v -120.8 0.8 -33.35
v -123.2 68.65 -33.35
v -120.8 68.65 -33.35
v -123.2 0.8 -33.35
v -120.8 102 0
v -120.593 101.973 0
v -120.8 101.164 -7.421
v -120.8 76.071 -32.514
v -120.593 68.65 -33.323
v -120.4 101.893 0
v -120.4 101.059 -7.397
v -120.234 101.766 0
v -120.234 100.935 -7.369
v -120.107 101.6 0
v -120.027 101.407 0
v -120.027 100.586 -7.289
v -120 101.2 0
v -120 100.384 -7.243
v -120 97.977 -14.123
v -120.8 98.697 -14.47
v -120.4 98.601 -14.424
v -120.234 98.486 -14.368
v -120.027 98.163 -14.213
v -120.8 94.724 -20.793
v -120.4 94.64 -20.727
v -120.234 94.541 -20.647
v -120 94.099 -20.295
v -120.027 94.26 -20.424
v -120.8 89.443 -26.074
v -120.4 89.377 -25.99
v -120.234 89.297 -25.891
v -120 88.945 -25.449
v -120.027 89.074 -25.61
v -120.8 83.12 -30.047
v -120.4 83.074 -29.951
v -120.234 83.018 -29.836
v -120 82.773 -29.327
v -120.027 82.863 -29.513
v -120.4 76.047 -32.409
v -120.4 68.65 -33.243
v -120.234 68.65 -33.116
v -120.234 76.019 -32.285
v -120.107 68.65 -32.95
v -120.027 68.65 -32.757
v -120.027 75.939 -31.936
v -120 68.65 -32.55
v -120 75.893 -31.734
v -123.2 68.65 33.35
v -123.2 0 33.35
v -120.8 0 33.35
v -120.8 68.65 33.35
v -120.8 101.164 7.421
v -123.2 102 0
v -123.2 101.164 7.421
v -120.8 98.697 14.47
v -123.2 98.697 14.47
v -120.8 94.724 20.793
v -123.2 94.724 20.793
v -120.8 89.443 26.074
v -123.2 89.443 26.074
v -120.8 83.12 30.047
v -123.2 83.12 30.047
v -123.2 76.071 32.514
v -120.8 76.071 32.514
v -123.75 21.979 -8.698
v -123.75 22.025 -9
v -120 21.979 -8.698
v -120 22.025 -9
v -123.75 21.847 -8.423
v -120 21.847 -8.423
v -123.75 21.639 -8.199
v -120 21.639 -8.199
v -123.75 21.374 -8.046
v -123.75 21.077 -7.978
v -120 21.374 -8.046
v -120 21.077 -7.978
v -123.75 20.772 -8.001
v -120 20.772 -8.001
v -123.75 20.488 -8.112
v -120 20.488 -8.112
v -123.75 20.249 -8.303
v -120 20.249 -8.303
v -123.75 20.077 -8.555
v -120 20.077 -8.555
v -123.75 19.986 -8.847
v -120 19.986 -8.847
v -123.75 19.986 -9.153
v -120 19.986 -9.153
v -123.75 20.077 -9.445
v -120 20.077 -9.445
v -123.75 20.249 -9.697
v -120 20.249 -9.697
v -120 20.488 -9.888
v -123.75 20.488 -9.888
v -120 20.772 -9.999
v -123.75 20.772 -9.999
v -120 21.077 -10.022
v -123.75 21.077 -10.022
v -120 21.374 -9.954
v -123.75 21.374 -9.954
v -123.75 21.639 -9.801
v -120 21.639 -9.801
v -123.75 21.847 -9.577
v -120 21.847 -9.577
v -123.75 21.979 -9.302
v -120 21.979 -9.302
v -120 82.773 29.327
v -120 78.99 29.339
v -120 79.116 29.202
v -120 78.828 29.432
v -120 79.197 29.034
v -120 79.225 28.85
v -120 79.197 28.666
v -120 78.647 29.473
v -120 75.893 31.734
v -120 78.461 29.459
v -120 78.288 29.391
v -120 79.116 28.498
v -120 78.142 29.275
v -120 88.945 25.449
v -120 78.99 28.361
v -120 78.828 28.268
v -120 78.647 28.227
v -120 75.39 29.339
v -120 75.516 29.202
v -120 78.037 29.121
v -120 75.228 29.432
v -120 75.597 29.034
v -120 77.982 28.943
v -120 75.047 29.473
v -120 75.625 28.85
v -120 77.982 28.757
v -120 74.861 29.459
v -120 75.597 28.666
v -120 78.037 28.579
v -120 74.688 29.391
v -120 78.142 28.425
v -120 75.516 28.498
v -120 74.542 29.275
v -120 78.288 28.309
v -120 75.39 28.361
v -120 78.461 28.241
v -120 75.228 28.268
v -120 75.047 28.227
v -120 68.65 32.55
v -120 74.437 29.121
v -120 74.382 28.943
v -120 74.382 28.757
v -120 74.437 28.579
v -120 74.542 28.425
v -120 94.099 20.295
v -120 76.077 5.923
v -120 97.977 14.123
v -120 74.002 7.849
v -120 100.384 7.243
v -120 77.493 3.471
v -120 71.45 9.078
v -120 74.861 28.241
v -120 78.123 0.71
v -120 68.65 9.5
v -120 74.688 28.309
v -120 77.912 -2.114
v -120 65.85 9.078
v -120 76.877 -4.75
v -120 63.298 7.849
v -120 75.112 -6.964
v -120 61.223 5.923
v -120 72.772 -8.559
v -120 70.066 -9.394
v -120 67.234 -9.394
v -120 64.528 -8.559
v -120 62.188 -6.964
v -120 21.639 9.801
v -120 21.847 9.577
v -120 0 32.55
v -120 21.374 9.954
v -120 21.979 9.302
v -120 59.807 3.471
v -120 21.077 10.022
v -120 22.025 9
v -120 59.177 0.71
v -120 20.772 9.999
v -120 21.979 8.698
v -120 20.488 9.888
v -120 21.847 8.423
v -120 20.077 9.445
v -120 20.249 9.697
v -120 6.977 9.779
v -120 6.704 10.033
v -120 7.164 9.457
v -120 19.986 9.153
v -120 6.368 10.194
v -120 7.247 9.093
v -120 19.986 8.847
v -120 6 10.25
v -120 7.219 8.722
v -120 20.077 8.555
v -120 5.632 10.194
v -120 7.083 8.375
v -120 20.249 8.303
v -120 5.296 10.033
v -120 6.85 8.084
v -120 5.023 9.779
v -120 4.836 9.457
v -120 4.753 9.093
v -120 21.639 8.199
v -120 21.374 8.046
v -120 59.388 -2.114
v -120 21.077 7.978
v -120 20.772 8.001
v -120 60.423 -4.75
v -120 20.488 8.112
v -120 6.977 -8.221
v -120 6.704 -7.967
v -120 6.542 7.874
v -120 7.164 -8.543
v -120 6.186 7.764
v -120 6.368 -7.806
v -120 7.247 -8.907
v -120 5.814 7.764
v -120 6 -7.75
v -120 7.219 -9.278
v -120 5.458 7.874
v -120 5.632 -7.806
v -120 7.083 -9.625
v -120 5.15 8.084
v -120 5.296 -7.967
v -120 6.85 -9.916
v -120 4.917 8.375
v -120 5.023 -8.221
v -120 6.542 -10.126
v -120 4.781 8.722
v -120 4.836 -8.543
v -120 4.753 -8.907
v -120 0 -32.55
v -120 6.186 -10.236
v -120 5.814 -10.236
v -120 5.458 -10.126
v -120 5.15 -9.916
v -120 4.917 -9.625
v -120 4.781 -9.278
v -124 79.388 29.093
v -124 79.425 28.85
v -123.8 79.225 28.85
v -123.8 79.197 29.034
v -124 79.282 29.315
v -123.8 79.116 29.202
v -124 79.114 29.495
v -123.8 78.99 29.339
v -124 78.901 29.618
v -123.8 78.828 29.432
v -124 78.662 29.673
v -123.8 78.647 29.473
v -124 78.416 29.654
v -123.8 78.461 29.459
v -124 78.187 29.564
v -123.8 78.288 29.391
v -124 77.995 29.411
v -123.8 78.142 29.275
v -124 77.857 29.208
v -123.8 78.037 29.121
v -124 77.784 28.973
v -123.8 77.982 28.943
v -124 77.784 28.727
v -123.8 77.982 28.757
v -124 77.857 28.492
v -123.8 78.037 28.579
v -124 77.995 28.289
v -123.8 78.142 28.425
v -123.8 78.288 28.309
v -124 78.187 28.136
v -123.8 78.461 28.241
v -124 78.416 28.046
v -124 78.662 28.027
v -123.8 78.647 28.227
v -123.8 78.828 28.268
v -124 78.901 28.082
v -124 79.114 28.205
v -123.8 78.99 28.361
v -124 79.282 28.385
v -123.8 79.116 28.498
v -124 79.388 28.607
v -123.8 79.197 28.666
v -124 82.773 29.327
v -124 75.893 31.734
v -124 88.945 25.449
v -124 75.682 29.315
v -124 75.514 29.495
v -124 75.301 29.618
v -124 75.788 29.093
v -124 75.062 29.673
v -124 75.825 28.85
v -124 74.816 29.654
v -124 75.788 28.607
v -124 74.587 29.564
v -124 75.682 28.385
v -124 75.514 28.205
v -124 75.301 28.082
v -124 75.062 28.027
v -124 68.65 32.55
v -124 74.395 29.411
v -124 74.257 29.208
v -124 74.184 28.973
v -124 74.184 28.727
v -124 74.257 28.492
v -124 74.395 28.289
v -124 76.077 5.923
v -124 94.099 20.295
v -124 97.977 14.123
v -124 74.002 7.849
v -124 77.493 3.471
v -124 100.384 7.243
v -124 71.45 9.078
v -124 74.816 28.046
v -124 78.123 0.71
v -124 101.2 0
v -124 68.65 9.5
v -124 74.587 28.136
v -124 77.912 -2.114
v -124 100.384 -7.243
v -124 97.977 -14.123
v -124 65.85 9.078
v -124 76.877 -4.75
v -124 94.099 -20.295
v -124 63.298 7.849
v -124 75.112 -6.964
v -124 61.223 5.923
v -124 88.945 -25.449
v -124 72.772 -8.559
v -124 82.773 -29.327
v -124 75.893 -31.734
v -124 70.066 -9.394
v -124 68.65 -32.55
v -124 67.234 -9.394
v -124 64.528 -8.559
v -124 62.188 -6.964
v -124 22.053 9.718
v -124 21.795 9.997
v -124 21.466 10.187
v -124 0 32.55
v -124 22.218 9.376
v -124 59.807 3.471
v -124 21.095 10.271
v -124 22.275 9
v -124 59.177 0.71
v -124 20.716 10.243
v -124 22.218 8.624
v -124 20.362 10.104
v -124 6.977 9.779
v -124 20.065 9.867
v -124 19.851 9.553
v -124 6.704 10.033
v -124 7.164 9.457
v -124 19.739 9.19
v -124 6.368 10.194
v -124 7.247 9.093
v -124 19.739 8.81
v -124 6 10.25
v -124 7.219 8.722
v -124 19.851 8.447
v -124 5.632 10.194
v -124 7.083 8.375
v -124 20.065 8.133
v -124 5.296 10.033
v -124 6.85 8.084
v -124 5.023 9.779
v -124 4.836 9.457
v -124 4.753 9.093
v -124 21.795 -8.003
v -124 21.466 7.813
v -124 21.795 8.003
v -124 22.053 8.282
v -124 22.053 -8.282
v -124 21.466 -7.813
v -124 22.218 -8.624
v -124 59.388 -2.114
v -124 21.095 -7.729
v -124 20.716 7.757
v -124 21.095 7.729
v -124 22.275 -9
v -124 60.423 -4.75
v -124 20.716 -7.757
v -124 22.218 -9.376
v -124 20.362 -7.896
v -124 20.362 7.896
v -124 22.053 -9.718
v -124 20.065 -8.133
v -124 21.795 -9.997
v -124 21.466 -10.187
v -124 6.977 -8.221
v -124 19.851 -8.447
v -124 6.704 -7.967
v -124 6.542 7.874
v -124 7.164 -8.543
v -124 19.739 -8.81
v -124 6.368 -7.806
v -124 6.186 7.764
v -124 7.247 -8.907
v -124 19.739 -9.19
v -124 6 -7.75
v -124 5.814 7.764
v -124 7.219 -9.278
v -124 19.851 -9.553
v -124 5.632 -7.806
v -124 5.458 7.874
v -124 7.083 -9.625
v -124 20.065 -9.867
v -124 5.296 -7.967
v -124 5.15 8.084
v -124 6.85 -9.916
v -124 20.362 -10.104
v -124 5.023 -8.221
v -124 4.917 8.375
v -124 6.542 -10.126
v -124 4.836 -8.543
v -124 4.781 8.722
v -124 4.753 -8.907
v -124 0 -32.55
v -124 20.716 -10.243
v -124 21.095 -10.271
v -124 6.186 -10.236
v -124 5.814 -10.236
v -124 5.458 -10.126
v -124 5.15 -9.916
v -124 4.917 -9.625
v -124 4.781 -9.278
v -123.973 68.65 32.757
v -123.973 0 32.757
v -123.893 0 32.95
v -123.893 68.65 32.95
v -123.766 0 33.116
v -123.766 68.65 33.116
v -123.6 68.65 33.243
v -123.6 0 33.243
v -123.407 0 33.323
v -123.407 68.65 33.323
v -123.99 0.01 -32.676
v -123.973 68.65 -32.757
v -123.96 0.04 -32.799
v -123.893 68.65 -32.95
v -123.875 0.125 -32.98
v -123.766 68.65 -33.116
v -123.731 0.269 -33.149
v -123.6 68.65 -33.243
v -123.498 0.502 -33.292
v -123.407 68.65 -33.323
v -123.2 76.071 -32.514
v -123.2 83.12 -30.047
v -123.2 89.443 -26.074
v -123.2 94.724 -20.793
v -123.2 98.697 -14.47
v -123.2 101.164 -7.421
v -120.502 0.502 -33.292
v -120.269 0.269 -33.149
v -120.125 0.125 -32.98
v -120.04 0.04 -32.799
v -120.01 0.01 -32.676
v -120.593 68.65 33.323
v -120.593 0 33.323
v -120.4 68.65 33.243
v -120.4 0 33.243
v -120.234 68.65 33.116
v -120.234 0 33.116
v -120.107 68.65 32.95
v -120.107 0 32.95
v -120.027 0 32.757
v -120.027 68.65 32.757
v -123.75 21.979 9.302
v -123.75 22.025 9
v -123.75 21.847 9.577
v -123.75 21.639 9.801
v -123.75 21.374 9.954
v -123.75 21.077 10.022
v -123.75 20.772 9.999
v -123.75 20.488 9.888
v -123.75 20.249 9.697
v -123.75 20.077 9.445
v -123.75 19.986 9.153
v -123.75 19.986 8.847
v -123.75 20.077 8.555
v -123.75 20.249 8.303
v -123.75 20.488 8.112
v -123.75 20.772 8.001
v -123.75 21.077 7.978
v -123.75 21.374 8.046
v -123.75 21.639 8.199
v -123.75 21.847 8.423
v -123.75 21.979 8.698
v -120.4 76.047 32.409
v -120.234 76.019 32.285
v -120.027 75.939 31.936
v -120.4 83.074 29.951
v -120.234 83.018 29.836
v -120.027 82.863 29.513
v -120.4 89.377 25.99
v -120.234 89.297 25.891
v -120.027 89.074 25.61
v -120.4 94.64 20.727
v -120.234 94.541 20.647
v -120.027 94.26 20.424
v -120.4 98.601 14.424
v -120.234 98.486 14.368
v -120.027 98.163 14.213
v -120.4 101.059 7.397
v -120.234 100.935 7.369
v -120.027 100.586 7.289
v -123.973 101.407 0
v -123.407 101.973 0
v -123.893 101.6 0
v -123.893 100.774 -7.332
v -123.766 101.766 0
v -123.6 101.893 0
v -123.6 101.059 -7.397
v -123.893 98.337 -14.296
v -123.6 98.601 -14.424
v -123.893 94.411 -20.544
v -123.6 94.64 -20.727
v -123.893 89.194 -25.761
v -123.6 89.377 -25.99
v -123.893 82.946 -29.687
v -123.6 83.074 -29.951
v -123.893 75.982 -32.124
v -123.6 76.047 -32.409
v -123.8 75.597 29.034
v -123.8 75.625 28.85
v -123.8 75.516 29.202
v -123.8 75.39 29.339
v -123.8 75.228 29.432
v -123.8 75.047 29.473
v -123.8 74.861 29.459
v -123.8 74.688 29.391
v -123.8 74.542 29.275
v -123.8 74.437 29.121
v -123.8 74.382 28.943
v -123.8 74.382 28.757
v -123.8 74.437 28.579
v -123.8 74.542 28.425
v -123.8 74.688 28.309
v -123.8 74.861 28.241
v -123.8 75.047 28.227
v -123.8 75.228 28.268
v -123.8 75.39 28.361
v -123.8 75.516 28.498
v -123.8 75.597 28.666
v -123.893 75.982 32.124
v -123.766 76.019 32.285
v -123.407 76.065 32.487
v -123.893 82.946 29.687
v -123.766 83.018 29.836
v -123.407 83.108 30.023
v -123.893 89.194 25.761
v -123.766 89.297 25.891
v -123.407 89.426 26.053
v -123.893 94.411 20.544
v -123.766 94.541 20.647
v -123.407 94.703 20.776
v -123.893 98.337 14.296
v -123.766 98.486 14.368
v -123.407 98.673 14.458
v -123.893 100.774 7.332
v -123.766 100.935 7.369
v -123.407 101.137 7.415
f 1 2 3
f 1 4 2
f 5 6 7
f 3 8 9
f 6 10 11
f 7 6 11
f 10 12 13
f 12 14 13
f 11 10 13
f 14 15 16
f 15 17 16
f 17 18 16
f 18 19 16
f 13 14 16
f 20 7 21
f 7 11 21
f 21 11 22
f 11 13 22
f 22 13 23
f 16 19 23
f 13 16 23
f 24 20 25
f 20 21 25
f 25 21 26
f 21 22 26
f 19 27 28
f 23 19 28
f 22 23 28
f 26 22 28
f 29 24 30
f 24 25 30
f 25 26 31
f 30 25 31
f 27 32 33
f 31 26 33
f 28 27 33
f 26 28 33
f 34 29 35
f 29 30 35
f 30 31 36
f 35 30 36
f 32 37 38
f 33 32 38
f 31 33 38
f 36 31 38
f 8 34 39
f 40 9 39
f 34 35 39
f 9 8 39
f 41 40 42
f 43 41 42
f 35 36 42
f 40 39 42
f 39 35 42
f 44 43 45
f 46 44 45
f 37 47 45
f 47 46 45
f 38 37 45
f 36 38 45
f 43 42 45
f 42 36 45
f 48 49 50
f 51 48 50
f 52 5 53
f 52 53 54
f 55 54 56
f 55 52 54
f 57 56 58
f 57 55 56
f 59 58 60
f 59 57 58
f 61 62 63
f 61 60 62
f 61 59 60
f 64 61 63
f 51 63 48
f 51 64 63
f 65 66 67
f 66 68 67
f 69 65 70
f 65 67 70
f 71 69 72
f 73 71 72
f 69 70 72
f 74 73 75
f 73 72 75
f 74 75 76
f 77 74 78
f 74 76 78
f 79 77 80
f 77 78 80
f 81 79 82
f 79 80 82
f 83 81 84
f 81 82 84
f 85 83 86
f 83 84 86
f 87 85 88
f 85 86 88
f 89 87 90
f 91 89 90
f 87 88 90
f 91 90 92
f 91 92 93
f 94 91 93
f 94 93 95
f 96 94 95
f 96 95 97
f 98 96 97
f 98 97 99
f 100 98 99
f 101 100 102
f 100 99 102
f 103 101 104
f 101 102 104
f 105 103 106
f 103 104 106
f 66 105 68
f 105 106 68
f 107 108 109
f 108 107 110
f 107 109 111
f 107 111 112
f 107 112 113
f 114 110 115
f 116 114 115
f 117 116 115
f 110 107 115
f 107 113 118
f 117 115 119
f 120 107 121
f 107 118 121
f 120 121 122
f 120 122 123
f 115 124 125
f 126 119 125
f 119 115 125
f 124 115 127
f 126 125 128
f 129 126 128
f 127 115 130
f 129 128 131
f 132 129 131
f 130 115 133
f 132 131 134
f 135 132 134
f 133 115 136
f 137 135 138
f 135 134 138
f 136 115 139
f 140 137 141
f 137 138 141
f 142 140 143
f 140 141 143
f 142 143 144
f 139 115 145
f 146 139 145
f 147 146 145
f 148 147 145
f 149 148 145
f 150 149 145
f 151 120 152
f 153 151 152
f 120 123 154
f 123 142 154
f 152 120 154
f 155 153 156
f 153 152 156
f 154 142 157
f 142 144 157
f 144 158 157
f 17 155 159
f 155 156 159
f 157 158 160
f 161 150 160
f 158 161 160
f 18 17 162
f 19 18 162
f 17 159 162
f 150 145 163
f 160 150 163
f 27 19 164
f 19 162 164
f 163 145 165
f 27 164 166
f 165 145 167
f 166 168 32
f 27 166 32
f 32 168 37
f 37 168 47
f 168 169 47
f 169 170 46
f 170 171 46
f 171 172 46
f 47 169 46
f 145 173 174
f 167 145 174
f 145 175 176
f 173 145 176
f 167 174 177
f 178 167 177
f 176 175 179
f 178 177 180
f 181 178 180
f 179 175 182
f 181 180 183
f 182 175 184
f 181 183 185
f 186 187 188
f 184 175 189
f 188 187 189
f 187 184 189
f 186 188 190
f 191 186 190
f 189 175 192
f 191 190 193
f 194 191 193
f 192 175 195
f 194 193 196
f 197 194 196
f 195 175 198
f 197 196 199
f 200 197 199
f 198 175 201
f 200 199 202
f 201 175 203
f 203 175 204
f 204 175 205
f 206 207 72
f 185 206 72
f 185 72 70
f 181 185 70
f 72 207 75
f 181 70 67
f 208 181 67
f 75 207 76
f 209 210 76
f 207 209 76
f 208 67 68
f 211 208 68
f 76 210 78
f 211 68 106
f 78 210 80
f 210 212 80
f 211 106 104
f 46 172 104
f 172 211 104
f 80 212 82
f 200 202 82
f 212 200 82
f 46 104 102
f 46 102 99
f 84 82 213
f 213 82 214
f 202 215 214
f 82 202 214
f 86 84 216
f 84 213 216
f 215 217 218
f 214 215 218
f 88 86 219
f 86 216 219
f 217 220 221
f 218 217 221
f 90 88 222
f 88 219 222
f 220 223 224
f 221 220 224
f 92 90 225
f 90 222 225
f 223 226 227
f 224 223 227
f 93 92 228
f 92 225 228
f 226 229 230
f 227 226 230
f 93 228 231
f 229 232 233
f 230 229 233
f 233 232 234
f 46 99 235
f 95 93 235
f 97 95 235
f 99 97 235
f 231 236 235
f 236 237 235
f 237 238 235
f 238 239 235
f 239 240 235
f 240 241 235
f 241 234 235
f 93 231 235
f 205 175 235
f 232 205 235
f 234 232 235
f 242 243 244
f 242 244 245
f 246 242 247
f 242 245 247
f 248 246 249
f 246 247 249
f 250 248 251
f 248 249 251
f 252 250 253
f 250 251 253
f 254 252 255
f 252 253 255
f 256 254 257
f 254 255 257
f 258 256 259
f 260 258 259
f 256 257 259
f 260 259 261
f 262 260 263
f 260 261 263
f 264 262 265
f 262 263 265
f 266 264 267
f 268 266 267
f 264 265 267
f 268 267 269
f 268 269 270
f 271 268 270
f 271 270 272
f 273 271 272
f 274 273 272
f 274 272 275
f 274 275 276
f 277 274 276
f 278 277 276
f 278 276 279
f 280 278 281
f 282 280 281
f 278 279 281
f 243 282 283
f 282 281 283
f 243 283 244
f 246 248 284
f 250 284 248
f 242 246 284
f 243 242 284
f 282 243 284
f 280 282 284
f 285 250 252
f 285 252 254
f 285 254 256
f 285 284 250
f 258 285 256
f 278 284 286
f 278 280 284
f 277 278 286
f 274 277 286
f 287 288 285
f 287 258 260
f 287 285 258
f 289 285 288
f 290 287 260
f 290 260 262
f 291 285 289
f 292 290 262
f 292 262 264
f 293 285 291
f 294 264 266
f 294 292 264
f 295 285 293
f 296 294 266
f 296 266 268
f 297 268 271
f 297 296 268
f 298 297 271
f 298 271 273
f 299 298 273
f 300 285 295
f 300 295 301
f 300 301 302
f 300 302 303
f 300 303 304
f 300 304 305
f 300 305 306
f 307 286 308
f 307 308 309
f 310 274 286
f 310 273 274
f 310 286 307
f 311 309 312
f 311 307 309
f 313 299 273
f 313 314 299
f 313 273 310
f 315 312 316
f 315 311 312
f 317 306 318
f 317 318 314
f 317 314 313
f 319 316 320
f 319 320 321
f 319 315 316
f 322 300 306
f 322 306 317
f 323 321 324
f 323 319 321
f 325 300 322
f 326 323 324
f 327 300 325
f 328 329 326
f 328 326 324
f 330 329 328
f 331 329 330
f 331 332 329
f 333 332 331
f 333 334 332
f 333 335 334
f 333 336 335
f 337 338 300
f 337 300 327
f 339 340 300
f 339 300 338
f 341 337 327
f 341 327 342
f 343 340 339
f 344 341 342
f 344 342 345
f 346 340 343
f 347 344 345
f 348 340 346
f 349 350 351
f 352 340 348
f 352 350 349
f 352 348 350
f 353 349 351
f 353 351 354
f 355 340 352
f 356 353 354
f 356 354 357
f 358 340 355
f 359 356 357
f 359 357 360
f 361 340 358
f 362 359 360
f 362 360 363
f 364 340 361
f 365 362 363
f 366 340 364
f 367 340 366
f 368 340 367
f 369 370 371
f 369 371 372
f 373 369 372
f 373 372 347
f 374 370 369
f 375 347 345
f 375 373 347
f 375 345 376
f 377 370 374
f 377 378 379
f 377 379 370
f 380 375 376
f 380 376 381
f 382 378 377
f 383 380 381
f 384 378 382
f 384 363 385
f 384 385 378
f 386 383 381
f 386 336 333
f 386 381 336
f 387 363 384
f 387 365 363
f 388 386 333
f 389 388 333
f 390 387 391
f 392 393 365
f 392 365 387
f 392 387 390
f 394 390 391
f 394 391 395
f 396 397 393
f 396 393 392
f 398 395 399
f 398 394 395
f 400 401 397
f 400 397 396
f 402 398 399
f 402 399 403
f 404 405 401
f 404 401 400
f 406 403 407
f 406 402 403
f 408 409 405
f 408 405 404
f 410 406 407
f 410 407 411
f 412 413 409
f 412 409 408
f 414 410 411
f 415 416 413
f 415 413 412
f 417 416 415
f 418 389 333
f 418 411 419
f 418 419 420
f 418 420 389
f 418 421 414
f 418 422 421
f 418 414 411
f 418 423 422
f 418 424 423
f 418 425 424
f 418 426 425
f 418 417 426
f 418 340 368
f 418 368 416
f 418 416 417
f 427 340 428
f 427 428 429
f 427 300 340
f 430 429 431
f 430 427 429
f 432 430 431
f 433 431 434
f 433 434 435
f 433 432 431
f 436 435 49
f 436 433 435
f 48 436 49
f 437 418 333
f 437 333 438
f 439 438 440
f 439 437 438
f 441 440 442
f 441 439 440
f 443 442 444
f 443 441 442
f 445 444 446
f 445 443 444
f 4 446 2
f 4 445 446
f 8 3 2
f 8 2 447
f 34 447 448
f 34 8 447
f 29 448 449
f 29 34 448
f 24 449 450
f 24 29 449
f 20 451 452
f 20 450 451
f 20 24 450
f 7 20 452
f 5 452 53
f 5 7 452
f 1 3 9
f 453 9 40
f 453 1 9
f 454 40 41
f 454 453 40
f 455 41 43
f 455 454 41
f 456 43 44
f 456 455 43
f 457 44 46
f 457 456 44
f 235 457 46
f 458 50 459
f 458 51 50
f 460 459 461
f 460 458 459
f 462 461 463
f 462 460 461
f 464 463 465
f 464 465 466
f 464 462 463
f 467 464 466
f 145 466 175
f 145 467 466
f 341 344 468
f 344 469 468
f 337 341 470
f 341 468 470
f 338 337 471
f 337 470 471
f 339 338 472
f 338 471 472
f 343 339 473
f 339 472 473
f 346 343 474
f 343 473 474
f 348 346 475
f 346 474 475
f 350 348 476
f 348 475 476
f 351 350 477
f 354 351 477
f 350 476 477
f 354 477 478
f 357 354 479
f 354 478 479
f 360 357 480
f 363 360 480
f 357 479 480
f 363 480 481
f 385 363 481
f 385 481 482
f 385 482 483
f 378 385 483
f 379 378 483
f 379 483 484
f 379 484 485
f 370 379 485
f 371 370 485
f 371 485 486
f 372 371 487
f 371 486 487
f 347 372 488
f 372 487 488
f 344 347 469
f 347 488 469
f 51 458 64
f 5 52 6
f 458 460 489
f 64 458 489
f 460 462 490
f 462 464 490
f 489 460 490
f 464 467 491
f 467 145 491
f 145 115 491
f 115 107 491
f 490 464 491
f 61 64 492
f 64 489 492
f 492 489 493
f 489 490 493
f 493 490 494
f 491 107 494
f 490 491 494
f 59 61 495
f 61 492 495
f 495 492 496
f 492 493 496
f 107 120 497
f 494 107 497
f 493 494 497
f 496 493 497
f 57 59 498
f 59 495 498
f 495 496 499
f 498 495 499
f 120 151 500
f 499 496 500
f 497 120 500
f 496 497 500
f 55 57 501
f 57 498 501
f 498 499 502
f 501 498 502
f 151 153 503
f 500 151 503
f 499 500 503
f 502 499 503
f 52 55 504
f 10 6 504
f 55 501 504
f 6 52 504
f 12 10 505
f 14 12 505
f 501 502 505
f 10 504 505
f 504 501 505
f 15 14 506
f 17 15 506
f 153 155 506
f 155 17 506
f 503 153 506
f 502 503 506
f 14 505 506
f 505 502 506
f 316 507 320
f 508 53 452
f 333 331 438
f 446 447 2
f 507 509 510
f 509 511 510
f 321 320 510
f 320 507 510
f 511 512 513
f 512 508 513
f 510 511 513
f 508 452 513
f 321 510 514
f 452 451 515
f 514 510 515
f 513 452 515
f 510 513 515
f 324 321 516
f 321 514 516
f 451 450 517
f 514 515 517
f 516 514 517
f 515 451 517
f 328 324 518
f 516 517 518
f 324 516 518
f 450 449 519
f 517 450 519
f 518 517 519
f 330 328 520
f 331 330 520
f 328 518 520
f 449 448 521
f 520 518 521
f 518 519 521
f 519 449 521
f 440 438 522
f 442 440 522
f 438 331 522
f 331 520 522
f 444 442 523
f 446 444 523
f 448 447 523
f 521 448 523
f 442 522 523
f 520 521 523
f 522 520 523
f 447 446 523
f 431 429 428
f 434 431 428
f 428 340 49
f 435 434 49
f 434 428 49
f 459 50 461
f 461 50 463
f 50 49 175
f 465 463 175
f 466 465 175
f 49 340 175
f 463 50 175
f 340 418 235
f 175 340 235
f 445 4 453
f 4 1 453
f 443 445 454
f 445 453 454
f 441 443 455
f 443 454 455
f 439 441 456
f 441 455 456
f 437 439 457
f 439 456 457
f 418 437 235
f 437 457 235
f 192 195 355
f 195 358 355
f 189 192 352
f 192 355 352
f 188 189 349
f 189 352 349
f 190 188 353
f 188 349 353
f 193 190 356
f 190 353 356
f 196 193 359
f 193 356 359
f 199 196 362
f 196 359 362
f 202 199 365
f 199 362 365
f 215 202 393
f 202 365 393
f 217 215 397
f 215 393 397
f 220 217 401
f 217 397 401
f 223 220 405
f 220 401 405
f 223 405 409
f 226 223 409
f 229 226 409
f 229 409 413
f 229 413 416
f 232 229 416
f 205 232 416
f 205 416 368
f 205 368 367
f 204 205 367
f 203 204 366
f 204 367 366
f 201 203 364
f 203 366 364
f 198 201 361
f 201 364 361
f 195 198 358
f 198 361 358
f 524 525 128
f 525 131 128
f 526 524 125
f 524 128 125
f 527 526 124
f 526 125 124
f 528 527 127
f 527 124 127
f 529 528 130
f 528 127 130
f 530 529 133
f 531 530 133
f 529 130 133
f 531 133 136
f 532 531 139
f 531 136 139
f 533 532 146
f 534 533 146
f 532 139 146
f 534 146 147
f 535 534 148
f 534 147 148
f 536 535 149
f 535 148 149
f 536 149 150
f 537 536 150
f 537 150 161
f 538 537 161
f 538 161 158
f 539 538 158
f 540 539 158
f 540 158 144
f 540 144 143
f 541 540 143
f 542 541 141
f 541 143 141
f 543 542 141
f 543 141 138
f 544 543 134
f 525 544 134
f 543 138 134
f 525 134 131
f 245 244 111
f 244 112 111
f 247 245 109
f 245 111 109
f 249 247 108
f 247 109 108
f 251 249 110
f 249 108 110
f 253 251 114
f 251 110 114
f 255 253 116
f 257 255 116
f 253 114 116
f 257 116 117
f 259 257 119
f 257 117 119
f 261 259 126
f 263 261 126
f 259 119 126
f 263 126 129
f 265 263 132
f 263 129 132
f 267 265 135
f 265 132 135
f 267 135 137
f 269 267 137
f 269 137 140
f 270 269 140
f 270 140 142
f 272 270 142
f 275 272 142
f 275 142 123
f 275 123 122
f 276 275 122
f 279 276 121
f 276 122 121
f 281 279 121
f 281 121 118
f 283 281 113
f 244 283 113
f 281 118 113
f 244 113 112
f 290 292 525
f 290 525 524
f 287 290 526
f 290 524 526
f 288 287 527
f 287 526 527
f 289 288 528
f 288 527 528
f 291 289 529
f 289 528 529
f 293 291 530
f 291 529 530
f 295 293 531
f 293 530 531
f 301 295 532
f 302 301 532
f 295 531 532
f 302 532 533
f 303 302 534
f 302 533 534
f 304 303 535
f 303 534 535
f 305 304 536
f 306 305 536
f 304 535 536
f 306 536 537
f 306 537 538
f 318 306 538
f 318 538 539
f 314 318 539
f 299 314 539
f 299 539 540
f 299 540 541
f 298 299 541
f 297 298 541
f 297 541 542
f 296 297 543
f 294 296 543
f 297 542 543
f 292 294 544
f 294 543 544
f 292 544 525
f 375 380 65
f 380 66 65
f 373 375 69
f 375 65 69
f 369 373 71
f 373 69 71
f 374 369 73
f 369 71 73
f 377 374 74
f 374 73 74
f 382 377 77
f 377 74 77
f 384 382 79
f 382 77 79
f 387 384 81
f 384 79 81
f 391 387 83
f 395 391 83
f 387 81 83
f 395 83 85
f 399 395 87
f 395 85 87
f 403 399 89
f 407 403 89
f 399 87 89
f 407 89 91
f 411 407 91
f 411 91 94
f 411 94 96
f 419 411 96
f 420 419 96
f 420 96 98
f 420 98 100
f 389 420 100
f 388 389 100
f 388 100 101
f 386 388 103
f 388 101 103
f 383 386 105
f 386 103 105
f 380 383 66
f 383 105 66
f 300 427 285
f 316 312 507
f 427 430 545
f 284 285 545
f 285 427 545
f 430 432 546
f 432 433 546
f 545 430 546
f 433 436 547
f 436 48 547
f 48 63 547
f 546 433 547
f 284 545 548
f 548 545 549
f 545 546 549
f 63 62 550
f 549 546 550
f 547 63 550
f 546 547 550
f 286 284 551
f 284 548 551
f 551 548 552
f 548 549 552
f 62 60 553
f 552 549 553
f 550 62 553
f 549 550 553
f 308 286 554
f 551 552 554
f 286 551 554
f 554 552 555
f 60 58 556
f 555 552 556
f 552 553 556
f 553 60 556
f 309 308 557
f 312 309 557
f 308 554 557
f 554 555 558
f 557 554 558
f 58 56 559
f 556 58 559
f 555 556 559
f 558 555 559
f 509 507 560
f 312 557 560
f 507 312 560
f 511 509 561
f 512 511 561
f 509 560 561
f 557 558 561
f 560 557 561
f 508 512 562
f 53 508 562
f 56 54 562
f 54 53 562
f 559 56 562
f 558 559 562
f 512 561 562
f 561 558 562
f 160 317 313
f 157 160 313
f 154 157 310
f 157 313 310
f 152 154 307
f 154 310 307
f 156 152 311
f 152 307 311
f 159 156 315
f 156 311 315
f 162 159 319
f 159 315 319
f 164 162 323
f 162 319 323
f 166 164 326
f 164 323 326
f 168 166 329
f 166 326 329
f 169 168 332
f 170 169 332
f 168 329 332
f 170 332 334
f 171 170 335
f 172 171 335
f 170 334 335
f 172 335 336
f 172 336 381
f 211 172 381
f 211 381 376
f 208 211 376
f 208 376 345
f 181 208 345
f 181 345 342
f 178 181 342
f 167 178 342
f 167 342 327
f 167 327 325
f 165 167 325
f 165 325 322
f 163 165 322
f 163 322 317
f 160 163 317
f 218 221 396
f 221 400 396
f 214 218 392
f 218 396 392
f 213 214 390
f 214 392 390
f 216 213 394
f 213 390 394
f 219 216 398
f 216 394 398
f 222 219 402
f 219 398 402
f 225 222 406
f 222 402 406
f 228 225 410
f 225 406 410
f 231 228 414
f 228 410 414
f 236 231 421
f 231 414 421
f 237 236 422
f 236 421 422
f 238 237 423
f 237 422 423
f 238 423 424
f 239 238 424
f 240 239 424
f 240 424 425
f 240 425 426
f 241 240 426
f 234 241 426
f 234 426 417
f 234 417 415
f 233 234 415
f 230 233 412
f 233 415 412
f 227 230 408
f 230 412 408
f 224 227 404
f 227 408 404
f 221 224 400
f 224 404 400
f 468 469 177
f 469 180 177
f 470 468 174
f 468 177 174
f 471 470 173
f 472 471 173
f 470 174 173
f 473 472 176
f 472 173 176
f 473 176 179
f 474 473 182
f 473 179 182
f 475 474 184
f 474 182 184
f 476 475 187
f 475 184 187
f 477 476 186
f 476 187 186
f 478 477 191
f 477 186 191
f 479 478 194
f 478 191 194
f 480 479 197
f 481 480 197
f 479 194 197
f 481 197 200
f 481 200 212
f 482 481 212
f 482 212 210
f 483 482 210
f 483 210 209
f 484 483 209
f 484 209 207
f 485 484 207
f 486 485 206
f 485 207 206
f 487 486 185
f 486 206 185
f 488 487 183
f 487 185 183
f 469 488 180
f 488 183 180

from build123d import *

# Parameters (mm, degrees)
SKETCH_1_W                   = 40
SKETCH_1_H                   = 66.7
EXTRUDE_1_DEPTH              = 2
SKETCH_2_W                   = 4
SKETCH_2_H                   = 66.7
EXTRUDE_2_DEPTH              = 100
CUT_EXTRUDE_1_DEPTH          = 115.526077816
CUT_EXTRUDE_1_DEPTH_BACK     = 115.526077816
HOLE_WIZARD_M4_1_D           = 3.3
HOLE_WIZARD_M4_1_CSINK_D     = 4.05
HOLE_WIZARD_M4_1_CSINK_ANGLE = 90
HOLE_WIZARD_M4_2_AT_2_COUNT  = 2
HOLE_WIZARD_M4_2_AT_2_PITCH  = 68.59294731
HOLE_WIZARD_M4_2_AT_3_COUNT  = 2
HOLE_WIZARD_M4_2_AT_3_PITCH  = 26
HOLE_WIZARD_M4_2_AT_4_COUNT  = 2
HOLE_WIZARD_M4_2_AT_4_PITCH  = 62.376998966
HOLE_WIZARD_M4_2_AT_5_COUNT  = 2
HOLE_WIZARD_M4_2_AT_5_PITCH  = 56.7
SKETCH_11_W                  = 66.7
SKETCH_11_H                  = 2
EXTRUDE_3_DEPTH              = 100
SKETCH_13_W                  = 40
SKETCH_13_H                  = 66.7
EXTRUDE_4_DEPTH              = 2
SKETCH_14_W                  = 4
SKETCH_14_H                  = 66.7
EXTRUDE_5_DEPTH              = 100
CUT_EXTRUDE_2_DEPTH          = 180.589037806
CUT_EXTRUDE_2_DEPTH_BACK     = 180.589037806
HOLE_WIZARD_M4_3_AT_2_COUNT  = 2
HOLE_WIZARD_M4_3_AT_2_PITCH  = 26
HOLE_WIZARD_M4_3_AT_3_COUNT  = 2
HOLE_WIZARD_M4_3_AT_3_PITCH  = 62.376998966
HOLE_WIZARD_M4_3_AT_4_COUNT  = 2
HOLE_WIZARD_M4_3_AT_4_PITCH  = 56.7
CUT_EXTRUDE_3_REACH          = 181.589
SKETCH_18_R                  = 9.5
CUT_EXTRUDE_4_REACH          = 181.589
SKETCH_21_R                  = 11
CUT_EXTRUDE_5_REACH          = 181.589
SKETCH_22_R                  = 4.5
FILLET_1_R                   = 2
CUT_EXTRUDE_6_REACH          = 193.604
SKETCH_23_W                  = 36
SKETCH_23_H                  = 66.7
CUT_EXTRUDE_7_REACH          = 164.752
SKETCH_24_W                  = 36
SKETCH_24_H                  = 66.7
HOLE_WIZARD_M3_1_D           = 2.5
HOLE_WIZARD_M3_1_CSINK_D     = 3.05
HOLE_WIZARD_M3_1_CSINK_ANGLE = 90
CUT_EXTRUDE_8_DEPTH          = 154.990981879
CUT_EXTRUDE_8_DEPTH_BACK     = 154.990981879
SKETCH_27_W                  = 104
SKETCH_27_H                  = 66.7
FILLET_2_R                   = 0.8


# Read off the part's stored shape, not the designer's step: M2.5 螺纹孔1, M1.6 螺纹孔1
with BuildPart() as part:
    # 草图1 → 凸台-拉伸1 (new body)
    with BuildSketch(Plane(origin=(0, 0, 0), x_dir=(1, 0, 0), z_dir=(0, 1, 0))):
        Rectangle(SKETCH_1_W, SKETCH_1_H)
    extrude(amount=EXTRUDE_1_DEPTH)

    # 草图2 → 凸台-拉伸2 (add)
    with BuildSketch(Plane(origin=(0, 2, 0), x_dir=(1, 0, 0), z_dir=(0, 1, 0))):
        with Locations((-18, 0)):
            Rectangle(SKETCH_2_W, SKETCH_2_H)
    extrude(amount=EXTRUDE_2_DEPTH)

    # 草图5 → 切除-拉伸1 (cut, two sides: drawn at the far end of the back side and taken through both)
    with BuildSketch(Plane.ZY.offset(20).offset(-CUT_EXTRUDE_1_DEPTH_BACK)):
        with BuildLine():
            ThreePointArc((0, 102), (23.582011153, 92.232011153), (33.35, 68.65))
            Line((33.35, 68.65), (33.35, 102))
            Line((33.35, 102), (0, 102))
        make_face()
        with BuildLine():
            ThreePointArc((-33.35, 68.65), (-23.582011153, 92.232011153), (0, 102))
            Line((0, 102), (-33.35, 102))
            Line((-33.35, 102), (-33.35, 68.65))
        make_face()
    extrude(amount=CUT_EXTRUDE_1_DEPTH + CUT_EXTRUDE_1_DEPTH_BACK, mode=Mode.SUBTRACT)

    # M4 螺纹孔1 (through all)
    with Locations(Plane.ZY.offset(20)):
        with Locations((0, 97.65), (25.11473671, 54.15), (-25.11473671, 54.15)):
            CounterSinkHole(HOLE_WIZARD_M4_1_D / 2, HOLE_WIZARD_M4_1_CSINK_D / 2, counter_sink_angle=HOLE_WIZARD_M4_1_CSINK_ANGLE)

    # 草图10 → M4 螺纹孔2 (revolve, cut)
    with BuildSketch(Plane(origin=(15, 2, -28.35), x_dir=(0, 0, 1), z_dir=(1, 0, 0))):
        Polygon((0, 0), (0, 2), (1.65, 2), (1.65, 0.375), (2.025, 0), align=None)
    hole_wizard_m4_2 = revolve(axis=Axis((15, 8.35, -28.35), (0, -1, 0)), mode=Mode.SUBTRACT)

    # M4 螺纹孔2 at 2: M4 螺纹孔2 ×2
    with Locations(*[Vector(-0.9508085645250022, 0, 0.3097790722852413) * (i * HOLE_WIZARD_M4_2_AT_2_PITCH) for i in range(1, HOLE_WIZARD_M4_2_AT_2_COUNT)]):
        add(hole_wizard_m4_2, mode=Mode.SUBTRACT)

    # M4 螺纹孔2 at 3: M4 螺纹孔2 ×2
    with Locations(*[(-i * HOLE_WIZARD_M4_2_AT_3_PITCH, 0, 0) for i in range(1, HOLE_WIZARD_M4_2_AT_3_COUNT)]):
        add(hole_wizard_m4_2, mode=Mode.SUBTRACT)

    # M4 螺纹孔2 at 4: M4 螺纹孔2 ×2
    with Locations(*[Vector(-0.4168203092647413, 0, 0.9089889052042635) * (i * HOLE_WIZARD_M4_2_AT_4_PITCH) for i in range(1, HOLE_WIZARD_M4_2_AT_4_COUNT)]):
        add(hole_wizard_m4_2, mode=Mode.SUBTRACT)

    # M4 螺纹孔2 at 5: M4 螺纹孔2 ×2
    with Locations(*[(0, 0, i * HOLE_WIZARD_M4_2_AT_5_PITCH) for i in range(1, HOLE_WIZARD_M4_2_AT_5_COUNT)]):
        add(hole_wizard_m4_2, mode=Mode.SUBTRACT)

    # 草图11 → 凸台-拉伸3 (add)
    with BuildSketch(Plane.ZY.offset(20)):
        with Locations((0, 16)):
            Rectangle(SKETCH_11_W, SKETCH_11_H)
    extrude(amount=EXTRUDE_3_DEPTH)



with BuildPart() as body_2:
    # 草图13 → 凸台-拉伸4 (new body)
    with BuildSketch(Plane(origin=(0, 0, 0), x_dir=(1, 0, 0), z_dir=(0, 1, 0))):
        with Locations((-140, 0)):
            Rectangle(SKETCH_13_W, SKETCH_13_H)
    extrude(amount=EXTRUDE_4_DEPTH)


with BuildPart() as part_1:
    add(part.part)

    add(body_2.part)  # 凸台-拉伸5 merges body 2
    # 草图14 → 凸台-拉伸5 (add)
    with BuildSketch(Plane(origin=(0, 2, 0), x_dir=(1, 0, 0), z_dir=(0, 1, 0))):
        with Locations((-122, 0)):
            Rectangle(SKETCH_14_W, SKETCH_14_H)
    extrude(amount=EXTRUDE_5_DEPTH)

    # 草图15 → 切除-拉伸2 (cut, two sides: drawn at the far end of the back side and taken through both)
    with BuildSketch(Plane.ZY.offset(124).offset(-CUT_EXTRUDE_2_DEPTH_BACK)):
        with BuildLine():
            ThreePointArc((0, 102), (23.582011153, 92.232011153), (33.35, 68.65))
            Line((33.35, 68.65), (33.35, 102))
            Line((33.35, 102), (0, 102))
        make_face()
        with BuildLine():
            ThreePointArc((-33.35, 68.65), (-23.582011153, 92.232011153), (0, 102))
            Line((0, 102), (-33.35, 102))
            Line((-33.35, 102), (-33.35, 68.65))
        make_face()
    extrude(amount=CUT_EXTRUDE_2_DEPTH + CUT_EXTRUDE_2_DEPTH_BACK, mode=Mode.SUBTRACT)

    # 草图17 → M4 螺纹孔3 (revolve, cut)
    with BuildSketch(Plane(origin=(-129, 2, -28.35), x_dir=(0, 0, 1), z_dir=(1, 0, 0))):
        Polygon((0, 0), (0, 2), (1.65, 2), (1.65, 0.375), (2.025, 0), align=None)
    hole_wizard_m4_3 = revolve(axis=Axis((-129, 8.35, -28.35), (0, -1, 0)), mode=Mode.SUBTRACT)

    # M4 螺纹孔3 at 2: M4 螺纹孔3 ×2
    with Locations(*[(-i * HOLE_WIZARD_M4_3_AT_2_PITCH, 0, 0) for i in range(1, HOLE_WIZARD_M4_3_AT_2_COUNT)]):
        add(hole_wizard_m4_3, mode=Mode.SUBTRACT)

    # M4 螺纹孔3 at 3: M4 螺纹孔3 ×2
    with Locations(*[Vector(-0.41682030926474106, 0, 0.9089889052042636) * (i * HOLE_WIZARD_M4_3_AT_3_PITCH) for i in range(1, HOLE_WIZARD_M4_3_AT_3_COUNT)]):
        add(hole_wizard_m4_3, mode=Mode.SUBTRACT)

    # M4 螺纹孔3 at 4: M4 螺纹孔3 ×2
    with Locations(*[(0, 0, i * HOLE_WIZARD_M4_3_AT_4_PITCH) for i in range(1, HOLE_WIZARD_M4_3_AT_4_COUNT)]):
        add(hole_wizard_m4_3, mode=Mode.SUBTRACT)

    # 草图18 → 切除-拉伸3 (cut, up to next)
    with BuildSketch(Plane.ZY.offset(124), mode=Mode.PRIVATE) as cut_extrude_3_sk1:
        with Locations((0, 68.65)):
            Circle(SKETCH_18_R)
    cut_extrude_3_tool1 = extrude(cut_extrude_3_sk1.sketch, amount=-CUT_EXTRUDE_3_REACH, mode=Mode.PRIVATE) & part_1.part
    add(cut_extrude_3_tool1.solids().sort_by_distance((-124, 68.65, 0))[0], mode=Mode.SUBTRACT)

    # 草图21 → 切除-拉伸4 (cut, up to next)
    with BuildSketch(Plane(origin=(-16, 0, 0), x_dir=(0, 0, -1), z_dir=(1, 0, 0)), mode=Mode.PRIVATE) as cut_extrude_4_sk1:
        with Locations((0, 68.65)):
            Circle(SKETCH_21_R)
    cut_extrude_4_tool1 = extrude(cut_extrude_4_sk1.sketch, amount=-CUT_EXTRUDE_4_REACH, mode=Mode.PRIVATE) & part_1.part
    add(cut_extrude_4_tool1.solids().sort_by_distance((-16, 68.65, 0))[0], mode=Mode.SUBTRACT)

    # 草图22 → 切除-拉伸5 (cut, up to next)
    with BuildSketch(Plane(origin=(-16, 0, 0), x_dir=(0, 0, -1), z_dir=(1, 0, 0)), mode=Mode.PRIVATE) as cut_extrude_5_sk1:
        with Locations((16.670989023, 59.025)):
            Circle(SKETCH_22_R)
    cut_extrude_5_tool1 = extrude(cut_extrude_5_sk1.sketch, amount=-CUT_EXTRUDE_5_REACH, mode=Mode.PRIVATE) & part_1.part
    add(cut_extrude_5_tool1.solids().sort_by_distance((-16, 59.025, -16.670989))[0], mode=Mode.SUBTRACT)

    # 圆角1
    fillet_1_edges = [part_1.edges().sort_by_distance(p)[0] for p in [
        (-160, 1, -33.35),
        (-160, 1, 33.35),
        (20, 1, 33.35),
        (20, 1, -33.35),
    ]]
    fillet(fillet_1_edges, radius=FILLET_1_R)

    # 草图23 → 切除-拉伸6 (cut, up to next)
    with BuildSketch(Plane(origin=(0, 2, 0), x_dir=(1, 0, 0), z_dir=(0, 1, 0)), mode=Mode.PRIVATE) as cut_extrude_6_sk1:
        with Locations((-142, 0)):
            Rectangle(SKETCH_23_W, SKETCH_23_H)
    cut_extrude_6_tool1 = extrude(cut_extrude_6_sk1.sketch, amount=-CUT_EXTRUDE_6_REACH, mode=Mode.PRIVATE) & part_1.part
    add(cut_extrude_6_tool1.solids().sort_by_distance((-142, 2, 0))[0], mode=Mode.SUBTRACT)

    # 草图24 → 切除-拉伸7 (cut, up to next)
    with BuildSketch(Plane(origin=(0, 2, 0), x_dir=(1, 0, 0), z_dir=(0, 1, 0)), mode=Mode.PRIVATE) as cut_extrude_7_sk1:
        with Locations((2, 0)):
            Rectangle(SKETCH_24_W, SKETCH_24_H)
    cut_extrude_7_tool1 = extrude(cut_extrude_7_sk1.sketch, amount=-CUT_EXTRUDE_7_REACH, mode=Mode.PRIVATE) & part_1.part
    add(cut_extrude_7_tool1.solids().sort_by_distance((2, 2, 0))[0], mode=Mode.SUBTRACT)

    # M3 螺纹孔1 (through all)
    with Locations(Plane(origin=(-16, 0, 0), x_dir=(0, 0, -1), z_dir=(1, 0, 0))):
        with Locations((9, 6), (-9, 6)):
            CounterSinkHole(HOLE_WIZARD_M3_1_D / 2, HOLE_WIZARD_M3_1_CSINK_D / 2, counter_sink_angle=HOLE_WIZARD_M3_1_CSINK_ANGLE)

    # 草图27 → 切除-拉伸8 (cut, two sides: drawn at the far end of the back side and taken through both)
    with BuildSketch(Plane(origin=(0, 17, 0), x_dir=(1, 0, 0), z_dir=(0, 1, 0)).offset(-CUT_EXTRUDE_8_DEPTH_BACK)):
        with Locations((-68, 0)):
            Rectangle(SKETCH_27_W, SKETCH_27_H)
    extrude(amount=CUT_EXTRUDE_8_DEPTH + CUT_EXTRUDE_8_DEPTH_BACK, mode=Mode.SUBTRACT)

    # M2.5 螺纹孔1 outline → M2.5 螺纹孔1 (revolve, cut)
    with BuildSketch(Plane(origin=(0, 21, -9), x_dir=(0, 1, 0), z_dir=(0, 0, -1))):
        Polygon((1.025, -123.75), (1.025, -120), (0, -120), (0, -124), (1.275, -124), align=None)
    revolve(axis=Axis((0, 21, -9), (1, 0, 0)), mode=Mode.SUBTRACT)

    # Hole Wizard M2.5 _1 2 outline → Hole Wizard M2.5 _1 2 (revolve, cut)
    with BuildSketch(Plane(origin=(0, 21, 9), x_dir=(0, 1, 0), z_dir=(0, 0, -1))):
        Polygon((1.025, -123.75), (1.025, -120), (0, -120), (0, -124), (1.275, -124), align=None)
    revolve(axis=Axis((0, 21, 9), (1, 0, 0)), mode=Mode.SUBTRACT)

    # 圆角2
    fillet_2_edges = [part_1.edges().sort_by_distance(p)[0] for p in [
        (-120, 34.325, 33.35),
        (-120, 34.325, -33.35),
        (-122, 0, -33.35),
        (-124, 34.325, -33.35),
        (-120, 102, 0),
        (-124, 102, 0),
        (-124, 34.325, 33.35),
    ]]
    fillet(fillet_2_edges, radius=FILLET_2_R)

    # M1.6 螺纹孔1 outline → M1.6 螺纹孔1 (revolve, cut)
    with BuildSketch(Plane(origin=(0, 75, 28.85), x_dir=(0, 1, 0), z_dir=(0, 0, -1))):
        Polygon((0.625, -123.8), (0.625, -120), (0, -120), (0, -124), (0.825, -124), align=None)
    revolve(axis=Axis((0, 75, 28.85), (1, 0, 0)), mode=Mode.SUBTRACT)

    # Hole Wizard M1.6 _1 2 outline → Hole Wizard M1.6 _1 2 (revolve, cut)
    with BuildSketch(Plane(origin=(0, 78.6, 28.85), x_dir=(0, 1, 0), z_dir=(0, 0, -1))):
        Polygon((0.625, -123.8), (0.625, -120), (0, -120), (0, -124), (0.825, -124), align=None)
    revolve(axis=Axis((0, 78.6, 28.85), (1, 0, 0)), mode=Mode.SUBTRACT)


solid = part_1.part
